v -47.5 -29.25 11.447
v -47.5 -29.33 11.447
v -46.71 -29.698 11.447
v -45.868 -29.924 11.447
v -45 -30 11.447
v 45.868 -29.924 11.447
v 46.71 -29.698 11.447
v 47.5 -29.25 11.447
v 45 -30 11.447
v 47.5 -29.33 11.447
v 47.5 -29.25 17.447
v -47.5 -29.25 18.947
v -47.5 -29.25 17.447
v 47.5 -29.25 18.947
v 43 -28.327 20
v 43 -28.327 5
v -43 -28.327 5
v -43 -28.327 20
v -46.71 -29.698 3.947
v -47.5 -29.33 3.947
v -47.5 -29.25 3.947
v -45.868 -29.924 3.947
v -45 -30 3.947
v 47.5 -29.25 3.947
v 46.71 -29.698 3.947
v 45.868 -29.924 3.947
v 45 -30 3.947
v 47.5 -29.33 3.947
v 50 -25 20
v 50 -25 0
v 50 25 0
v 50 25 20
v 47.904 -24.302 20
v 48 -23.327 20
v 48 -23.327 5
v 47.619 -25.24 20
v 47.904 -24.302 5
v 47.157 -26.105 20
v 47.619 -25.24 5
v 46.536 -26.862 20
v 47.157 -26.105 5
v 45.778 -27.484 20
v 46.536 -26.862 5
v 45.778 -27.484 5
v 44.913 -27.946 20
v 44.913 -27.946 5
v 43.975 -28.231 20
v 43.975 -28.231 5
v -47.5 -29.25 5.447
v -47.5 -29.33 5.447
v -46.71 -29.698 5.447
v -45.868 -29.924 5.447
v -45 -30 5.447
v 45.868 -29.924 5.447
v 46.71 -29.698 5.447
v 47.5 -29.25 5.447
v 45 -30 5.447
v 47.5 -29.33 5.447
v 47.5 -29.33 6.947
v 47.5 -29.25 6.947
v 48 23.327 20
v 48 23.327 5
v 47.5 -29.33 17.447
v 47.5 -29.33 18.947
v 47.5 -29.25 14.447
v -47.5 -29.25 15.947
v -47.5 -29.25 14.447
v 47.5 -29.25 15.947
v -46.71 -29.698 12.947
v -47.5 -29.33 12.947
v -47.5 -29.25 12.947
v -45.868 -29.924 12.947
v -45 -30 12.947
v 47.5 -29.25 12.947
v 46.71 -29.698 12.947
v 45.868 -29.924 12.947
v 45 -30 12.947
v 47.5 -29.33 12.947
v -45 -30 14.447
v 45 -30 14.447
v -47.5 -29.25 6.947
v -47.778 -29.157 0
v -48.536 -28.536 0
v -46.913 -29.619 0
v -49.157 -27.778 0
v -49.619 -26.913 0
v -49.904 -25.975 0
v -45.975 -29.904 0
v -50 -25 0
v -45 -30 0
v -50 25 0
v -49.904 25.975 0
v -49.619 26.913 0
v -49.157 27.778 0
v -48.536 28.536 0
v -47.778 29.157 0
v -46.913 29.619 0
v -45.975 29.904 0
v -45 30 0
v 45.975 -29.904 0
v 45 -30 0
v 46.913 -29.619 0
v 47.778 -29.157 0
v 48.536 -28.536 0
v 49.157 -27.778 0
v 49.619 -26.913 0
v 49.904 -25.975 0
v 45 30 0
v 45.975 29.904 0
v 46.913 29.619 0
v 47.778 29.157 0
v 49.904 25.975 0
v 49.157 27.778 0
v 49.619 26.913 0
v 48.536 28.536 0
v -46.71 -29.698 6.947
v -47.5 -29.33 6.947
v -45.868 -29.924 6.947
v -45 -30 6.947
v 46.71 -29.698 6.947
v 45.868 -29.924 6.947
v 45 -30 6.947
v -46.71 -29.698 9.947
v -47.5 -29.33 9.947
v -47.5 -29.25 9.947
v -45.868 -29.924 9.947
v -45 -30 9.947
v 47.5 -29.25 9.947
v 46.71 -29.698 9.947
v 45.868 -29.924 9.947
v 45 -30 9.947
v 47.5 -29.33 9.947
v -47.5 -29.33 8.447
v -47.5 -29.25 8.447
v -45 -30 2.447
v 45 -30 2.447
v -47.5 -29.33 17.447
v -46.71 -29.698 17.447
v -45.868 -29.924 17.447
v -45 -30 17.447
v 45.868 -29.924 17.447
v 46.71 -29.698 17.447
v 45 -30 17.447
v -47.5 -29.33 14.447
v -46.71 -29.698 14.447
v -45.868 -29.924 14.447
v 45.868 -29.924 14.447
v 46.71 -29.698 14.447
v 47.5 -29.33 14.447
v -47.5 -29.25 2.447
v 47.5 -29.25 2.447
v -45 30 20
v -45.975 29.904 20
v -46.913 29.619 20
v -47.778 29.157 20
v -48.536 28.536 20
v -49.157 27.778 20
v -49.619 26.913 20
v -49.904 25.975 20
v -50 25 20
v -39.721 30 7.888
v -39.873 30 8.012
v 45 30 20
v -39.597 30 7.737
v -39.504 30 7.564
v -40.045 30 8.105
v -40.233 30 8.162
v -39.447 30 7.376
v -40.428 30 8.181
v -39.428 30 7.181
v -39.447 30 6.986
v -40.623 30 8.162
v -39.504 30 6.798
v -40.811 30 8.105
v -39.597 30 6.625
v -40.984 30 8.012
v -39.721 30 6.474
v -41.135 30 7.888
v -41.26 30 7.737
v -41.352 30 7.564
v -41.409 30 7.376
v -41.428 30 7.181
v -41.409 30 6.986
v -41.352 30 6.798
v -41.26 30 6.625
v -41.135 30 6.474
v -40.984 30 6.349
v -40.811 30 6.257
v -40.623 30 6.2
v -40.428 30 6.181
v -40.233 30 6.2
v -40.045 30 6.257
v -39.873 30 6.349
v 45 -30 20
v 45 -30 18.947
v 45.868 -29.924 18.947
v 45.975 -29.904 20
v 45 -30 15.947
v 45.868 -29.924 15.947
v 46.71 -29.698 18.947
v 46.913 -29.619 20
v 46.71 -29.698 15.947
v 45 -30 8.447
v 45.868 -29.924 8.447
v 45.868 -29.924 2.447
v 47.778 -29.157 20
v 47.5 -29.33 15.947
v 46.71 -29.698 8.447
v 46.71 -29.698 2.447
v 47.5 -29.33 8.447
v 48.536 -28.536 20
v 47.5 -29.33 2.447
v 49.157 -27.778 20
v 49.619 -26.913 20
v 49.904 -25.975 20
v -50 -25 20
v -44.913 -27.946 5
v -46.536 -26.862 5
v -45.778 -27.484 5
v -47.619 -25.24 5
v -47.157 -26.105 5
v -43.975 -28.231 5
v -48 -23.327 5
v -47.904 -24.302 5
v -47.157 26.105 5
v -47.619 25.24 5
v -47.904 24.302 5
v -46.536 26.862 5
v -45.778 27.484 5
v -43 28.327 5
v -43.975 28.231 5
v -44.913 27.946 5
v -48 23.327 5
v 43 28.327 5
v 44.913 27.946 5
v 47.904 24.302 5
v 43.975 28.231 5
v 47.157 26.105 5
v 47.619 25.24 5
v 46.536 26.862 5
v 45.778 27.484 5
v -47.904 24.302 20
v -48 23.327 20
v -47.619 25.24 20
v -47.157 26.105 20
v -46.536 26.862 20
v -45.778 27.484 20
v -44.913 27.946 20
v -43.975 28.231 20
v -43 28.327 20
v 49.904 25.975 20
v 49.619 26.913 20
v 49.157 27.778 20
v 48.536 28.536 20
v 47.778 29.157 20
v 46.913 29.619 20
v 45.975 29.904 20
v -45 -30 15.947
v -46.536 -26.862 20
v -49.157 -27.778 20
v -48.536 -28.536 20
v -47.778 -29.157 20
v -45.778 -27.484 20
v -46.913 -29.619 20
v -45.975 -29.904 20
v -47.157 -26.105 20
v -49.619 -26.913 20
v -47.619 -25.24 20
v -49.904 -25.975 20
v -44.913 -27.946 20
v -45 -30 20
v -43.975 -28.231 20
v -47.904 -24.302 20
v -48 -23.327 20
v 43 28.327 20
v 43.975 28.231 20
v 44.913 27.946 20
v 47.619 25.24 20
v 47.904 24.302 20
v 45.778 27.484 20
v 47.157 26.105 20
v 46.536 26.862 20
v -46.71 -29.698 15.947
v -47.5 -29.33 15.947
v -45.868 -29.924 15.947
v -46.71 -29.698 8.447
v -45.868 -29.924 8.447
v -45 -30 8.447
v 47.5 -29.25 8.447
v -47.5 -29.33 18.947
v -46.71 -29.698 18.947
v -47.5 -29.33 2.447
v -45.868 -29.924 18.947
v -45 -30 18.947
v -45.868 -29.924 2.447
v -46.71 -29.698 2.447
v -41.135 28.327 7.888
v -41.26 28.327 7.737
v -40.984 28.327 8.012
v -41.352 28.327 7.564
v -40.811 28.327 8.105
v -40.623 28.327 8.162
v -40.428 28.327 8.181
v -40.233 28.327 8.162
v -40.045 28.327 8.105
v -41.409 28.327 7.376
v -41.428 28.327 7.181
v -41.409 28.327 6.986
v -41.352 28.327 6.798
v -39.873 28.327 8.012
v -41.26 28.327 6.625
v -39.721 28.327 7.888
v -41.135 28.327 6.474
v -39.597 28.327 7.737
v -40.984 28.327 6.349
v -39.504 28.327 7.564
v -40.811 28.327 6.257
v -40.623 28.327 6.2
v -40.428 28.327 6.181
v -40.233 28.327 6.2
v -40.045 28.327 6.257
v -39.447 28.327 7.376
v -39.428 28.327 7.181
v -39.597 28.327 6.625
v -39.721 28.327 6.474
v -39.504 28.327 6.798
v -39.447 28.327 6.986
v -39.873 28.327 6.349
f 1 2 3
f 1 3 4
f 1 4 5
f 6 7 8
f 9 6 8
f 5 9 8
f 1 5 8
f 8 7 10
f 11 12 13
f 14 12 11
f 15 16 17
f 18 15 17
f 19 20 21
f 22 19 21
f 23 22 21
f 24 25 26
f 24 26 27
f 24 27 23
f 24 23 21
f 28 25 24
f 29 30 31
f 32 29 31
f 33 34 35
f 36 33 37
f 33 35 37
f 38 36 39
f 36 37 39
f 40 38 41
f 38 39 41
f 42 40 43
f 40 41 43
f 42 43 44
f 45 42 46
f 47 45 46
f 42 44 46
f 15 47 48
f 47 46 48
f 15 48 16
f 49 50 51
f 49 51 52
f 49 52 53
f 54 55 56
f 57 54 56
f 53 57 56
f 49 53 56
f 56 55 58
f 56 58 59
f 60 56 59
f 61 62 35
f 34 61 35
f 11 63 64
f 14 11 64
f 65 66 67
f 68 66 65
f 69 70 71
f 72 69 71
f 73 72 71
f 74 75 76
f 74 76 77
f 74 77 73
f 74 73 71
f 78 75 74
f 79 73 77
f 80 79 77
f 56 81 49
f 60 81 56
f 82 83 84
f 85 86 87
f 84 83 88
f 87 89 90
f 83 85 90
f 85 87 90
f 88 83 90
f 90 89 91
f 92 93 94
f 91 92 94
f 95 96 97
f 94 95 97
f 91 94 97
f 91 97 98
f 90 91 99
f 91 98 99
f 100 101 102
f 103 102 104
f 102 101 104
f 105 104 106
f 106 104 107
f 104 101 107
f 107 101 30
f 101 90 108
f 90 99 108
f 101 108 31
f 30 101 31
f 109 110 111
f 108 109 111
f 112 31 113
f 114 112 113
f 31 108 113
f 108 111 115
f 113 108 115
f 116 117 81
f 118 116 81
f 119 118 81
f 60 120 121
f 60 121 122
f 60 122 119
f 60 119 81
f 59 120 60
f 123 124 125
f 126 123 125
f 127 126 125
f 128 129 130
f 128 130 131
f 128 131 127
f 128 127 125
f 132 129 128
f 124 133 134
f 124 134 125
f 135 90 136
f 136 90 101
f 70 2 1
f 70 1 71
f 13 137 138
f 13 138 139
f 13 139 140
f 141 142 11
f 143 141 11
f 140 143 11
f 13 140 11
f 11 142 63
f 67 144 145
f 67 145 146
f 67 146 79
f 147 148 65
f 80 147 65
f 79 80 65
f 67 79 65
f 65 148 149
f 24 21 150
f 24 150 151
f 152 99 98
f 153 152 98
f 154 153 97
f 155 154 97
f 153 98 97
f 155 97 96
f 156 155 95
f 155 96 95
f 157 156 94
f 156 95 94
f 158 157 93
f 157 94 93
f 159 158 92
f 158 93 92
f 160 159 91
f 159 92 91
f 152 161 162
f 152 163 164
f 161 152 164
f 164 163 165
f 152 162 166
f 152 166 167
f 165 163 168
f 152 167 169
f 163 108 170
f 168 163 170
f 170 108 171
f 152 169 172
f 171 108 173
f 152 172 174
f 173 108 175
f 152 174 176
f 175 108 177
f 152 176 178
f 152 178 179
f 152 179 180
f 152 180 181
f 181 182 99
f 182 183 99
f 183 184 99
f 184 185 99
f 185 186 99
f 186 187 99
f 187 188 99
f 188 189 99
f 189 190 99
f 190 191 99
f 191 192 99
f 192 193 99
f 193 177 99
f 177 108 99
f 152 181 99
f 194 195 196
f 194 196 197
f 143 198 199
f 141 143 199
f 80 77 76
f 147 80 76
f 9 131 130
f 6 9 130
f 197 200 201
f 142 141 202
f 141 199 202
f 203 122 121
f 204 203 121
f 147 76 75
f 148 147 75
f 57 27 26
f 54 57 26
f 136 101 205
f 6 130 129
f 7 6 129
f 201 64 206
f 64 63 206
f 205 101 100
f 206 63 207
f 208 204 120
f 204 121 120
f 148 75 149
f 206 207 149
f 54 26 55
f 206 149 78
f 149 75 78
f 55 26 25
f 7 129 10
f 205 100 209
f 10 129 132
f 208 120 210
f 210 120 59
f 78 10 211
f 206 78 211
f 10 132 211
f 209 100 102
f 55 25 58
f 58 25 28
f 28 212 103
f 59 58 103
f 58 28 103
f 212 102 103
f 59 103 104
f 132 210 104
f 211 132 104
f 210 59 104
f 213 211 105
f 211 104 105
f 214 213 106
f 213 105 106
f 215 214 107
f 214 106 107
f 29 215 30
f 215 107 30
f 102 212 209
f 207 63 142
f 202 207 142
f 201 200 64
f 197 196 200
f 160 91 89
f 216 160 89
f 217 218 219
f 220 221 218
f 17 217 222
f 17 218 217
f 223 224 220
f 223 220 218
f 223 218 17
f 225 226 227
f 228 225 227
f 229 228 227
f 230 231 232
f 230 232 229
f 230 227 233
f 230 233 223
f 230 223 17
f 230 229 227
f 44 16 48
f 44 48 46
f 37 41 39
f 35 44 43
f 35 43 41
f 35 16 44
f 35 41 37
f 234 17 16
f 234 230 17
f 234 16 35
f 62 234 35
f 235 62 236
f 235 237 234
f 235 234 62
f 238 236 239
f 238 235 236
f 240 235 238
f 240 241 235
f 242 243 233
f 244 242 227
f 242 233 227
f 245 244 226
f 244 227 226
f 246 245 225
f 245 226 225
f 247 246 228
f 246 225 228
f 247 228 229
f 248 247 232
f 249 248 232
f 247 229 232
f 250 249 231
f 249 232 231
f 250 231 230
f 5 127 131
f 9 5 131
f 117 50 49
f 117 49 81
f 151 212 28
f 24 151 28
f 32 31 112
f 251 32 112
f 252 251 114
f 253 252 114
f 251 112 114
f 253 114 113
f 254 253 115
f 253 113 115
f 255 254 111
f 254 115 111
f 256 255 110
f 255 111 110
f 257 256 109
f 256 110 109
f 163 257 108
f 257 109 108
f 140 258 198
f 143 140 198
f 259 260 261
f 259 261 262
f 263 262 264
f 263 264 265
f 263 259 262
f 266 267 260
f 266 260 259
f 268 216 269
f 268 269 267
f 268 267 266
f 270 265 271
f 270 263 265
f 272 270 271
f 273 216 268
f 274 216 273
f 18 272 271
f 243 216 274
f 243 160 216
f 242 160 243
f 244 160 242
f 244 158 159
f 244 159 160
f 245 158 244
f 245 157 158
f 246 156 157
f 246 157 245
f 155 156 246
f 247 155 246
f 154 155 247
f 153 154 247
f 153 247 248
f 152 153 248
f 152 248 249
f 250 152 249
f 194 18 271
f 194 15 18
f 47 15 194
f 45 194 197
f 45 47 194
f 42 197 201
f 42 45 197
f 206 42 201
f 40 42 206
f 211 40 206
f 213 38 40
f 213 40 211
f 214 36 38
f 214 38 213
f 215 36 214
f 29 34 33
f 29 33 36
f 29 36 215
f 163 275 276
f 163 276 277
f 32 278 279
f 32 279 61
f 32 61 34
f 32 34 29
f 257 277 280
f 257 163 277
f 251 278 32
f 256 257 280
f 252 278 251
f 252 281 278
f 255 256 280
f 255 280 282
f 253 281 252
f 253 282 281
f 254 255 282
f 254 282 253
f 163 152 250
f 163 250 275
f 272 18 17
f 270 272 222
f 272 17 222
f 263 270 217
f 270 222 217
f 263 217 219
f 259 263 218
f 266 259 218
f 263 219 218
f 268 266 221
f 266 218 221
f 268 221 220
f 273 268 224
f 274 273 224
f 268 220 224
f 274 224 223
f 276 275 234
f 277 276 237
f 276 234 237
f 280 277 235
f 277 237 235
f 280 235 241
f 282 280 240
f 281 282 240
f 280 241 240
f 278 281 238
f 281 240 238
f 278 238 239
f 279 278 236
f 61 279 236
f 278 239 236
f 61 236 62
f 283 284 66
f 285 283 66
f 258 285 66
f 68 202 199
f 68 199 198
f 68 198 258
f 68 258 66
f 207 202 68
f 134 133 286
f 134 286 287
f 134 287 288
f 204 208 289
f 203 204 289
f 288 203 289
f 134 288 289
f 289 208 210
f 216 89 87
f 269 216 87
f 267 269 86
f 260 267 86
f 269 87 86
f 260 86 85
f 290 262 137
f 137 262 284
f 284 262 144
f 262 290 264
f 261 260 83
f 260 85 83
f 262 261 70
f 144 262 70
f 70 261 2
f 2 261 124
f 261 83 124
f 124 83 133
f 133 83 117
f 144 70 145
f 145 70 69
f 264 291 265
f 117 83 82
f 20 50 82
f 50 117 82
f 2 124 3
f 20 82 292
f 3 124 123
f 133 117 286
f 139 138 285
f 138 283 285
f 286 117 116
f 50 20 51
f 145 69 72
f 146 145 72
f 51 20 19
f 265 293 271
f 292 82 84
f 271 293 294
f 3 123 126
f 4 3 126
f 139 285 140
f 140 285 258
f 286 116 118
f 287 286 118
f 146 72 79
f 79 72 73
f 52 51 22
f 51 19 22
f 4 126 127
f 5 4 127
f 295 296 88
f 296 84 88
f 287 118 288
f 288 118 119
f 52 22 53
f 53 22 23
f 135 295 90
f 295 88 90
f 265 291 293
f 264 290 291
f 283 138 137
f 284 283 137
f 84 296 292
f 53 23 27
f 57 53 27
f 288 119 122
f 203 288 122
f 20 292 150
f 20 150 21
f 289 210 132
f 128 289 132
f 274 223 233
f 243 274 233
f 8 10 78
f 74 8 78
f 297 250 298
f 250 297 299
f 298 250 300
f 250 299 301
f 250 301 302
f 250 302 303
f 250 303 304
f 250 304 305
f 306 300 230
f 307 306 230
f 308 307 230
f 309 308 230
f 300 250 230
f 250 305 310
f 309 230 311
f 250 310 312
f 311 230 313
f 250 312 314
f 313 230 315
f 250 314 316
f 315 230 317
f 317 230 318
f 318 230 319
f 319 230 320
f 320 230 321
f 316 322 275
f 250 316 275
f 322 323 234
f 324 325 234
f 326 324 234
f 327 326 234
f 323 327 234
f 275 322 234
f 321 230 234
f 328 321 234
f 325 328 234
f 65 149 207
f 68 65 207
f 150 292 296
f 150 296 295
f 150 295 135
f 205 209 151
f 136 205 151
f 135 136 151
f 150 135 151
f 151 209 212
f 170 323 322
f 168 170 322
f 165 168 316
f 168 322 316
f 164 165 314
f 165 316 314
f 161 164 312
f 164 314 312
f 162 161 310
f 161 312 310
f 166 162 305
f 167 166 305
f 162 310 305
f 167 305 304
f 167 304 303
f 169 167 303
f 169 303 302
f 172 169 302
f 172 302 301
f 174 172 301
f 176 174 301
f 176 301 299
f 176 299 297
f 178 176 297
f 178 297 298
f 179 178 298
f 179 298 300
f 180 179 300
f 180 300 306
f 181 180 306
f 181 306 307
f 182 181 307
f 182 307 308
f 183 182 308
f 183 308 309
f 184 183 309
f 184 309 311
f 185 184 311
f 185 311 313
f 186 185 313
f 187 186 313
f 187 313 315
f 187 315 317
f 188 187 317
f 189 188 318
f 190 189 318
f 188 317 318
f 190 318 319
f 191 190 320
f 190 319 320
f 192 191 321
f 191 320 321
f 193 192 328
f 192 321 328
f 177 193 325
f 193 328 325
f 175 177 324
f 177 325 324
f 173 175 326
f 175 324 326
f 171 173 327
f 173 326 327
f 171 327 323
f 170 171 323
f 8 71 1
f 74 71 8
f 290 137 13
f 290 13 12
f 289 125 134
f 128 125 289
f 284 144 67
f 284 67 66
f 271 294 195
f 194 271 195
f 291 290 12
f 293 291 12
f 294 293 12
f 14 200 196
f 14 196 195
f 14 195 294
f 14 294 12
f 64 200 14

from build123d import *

# Parameters (mm, degrees)
F1_DEPTH = 20
F2_DEPTH = 5
F3_W     = 95
F3_H     = 1.5
F4_DEPTH = 0.75
F5_R     = 1
F6_DEPTH = 25


with BuildPart() as f1:
    # F0 (on Top) → F1 (new body)
    with BuildSketch(Plane.XY):
        with BuildLine():
            Line((-45, -30), (45, -30))
            ThreePointArc((45, -30), (48.535534, -28.535534), (50, -25))
            Line((50, -25), (50, 25))
            ThreePointArc((50, 25), (48.535534, 28.535534), (45, 30))
            Line((45, 30), (-45, 30))
            ThreePointArc((-45, 30), (-48.535534, 28.535534), (-50, 25))
            Line((-50, 25), (-50, -25))
            ThreePointArc((-50, -25), (-48.535534, -28.535534), (-45, -30))
        make_face()
        with BuildLine():
            ThreePointArc((-48, 23.32691), (-46.535534, 26.862444), (-43, 28.32691))
            Line((-43, 28.32691), (43, 28.32691))
            ThreePointArc((43, 28.32691), (46.535534, 26.862444), (48, 23.32691))
            Line((48, 23.32691), (48, -23.32691))
            ThreePointArc((48, -23.32691), (46.535534, -26.862444), (43, -28.32691))
            Line((43, -28.32691), (-43, -28.32691))
            ThreePointArc((-43, -28.32691), (-46.535534, -26.862444), (-48, -23.32691))
            Line((-48, -23.32691), (-48, 23.32691))
        make_face(mode=Mode.SUBTRACT)
    extrude(amount=F1_DEPTH)

    # F0 (on Top) → F2 (join)
    with BuildSketch(Plane.XY):
        with BuildLine():
            Line((43, 28.32691), (-43, 28.32691))
            ThreePointArc((-43, 28.32691), (-46.535534, 26.862444), (-48, 23.32691))
            Line((-48, 23.32691), (-48, -23.32691))
            ThreePointArc((-48, -23.32691), (-46.535534, -26.862444), (-43, -28.32691))
            Line((-43, -28.32691), (43, -28.32691))
            ThreePointArc((43, -28.32691), (46.535534, -26.862444), (48, -23.32691))
            Line((48, -23.32691), (48, 23.32691))
            ThreePointArc((48, 23.32691), (46.535534, 26.862444), (43, 28.32691))
        make_face()
    extrude(amount=F2_DEPTH)

    # F3 (on face) → F4 (cut)
    with BuildSketch(Plane.XZ.offset(30)):
        with Locations((0, 3.196598)):
            Rectangle(F3_W, F3_H)
        with Locations((0, 6.196598)):
            Rectangle(F3_W, F3_H)
        with Locations((0, 9.196598)):
            Rectangle(F3_W, F3_H)
        with Locations((0, 12.196598)):
            Rectangle(F3_W, F3_H)
        with Locations((0, 15.196598)):
            Rectangle(F3_W, F3_H)
        with Locations((0, 18.196598)):
            Rectangle(F3_W, F3_H)
    extrude(amount=-F4_DEPTH, mode=Mode.SUBTRACT)

    # F5 (on face) → F6 (cut)
    with BuildSketch(Plane.XZ.offset(-28.32691)):
        with Locations((-40.428117, 7.180942)):
            Circle(F5_R)
    extrude(amount=-F6_DEPTH, mode=Mode.SUBTRACT)


solid = f1.part
